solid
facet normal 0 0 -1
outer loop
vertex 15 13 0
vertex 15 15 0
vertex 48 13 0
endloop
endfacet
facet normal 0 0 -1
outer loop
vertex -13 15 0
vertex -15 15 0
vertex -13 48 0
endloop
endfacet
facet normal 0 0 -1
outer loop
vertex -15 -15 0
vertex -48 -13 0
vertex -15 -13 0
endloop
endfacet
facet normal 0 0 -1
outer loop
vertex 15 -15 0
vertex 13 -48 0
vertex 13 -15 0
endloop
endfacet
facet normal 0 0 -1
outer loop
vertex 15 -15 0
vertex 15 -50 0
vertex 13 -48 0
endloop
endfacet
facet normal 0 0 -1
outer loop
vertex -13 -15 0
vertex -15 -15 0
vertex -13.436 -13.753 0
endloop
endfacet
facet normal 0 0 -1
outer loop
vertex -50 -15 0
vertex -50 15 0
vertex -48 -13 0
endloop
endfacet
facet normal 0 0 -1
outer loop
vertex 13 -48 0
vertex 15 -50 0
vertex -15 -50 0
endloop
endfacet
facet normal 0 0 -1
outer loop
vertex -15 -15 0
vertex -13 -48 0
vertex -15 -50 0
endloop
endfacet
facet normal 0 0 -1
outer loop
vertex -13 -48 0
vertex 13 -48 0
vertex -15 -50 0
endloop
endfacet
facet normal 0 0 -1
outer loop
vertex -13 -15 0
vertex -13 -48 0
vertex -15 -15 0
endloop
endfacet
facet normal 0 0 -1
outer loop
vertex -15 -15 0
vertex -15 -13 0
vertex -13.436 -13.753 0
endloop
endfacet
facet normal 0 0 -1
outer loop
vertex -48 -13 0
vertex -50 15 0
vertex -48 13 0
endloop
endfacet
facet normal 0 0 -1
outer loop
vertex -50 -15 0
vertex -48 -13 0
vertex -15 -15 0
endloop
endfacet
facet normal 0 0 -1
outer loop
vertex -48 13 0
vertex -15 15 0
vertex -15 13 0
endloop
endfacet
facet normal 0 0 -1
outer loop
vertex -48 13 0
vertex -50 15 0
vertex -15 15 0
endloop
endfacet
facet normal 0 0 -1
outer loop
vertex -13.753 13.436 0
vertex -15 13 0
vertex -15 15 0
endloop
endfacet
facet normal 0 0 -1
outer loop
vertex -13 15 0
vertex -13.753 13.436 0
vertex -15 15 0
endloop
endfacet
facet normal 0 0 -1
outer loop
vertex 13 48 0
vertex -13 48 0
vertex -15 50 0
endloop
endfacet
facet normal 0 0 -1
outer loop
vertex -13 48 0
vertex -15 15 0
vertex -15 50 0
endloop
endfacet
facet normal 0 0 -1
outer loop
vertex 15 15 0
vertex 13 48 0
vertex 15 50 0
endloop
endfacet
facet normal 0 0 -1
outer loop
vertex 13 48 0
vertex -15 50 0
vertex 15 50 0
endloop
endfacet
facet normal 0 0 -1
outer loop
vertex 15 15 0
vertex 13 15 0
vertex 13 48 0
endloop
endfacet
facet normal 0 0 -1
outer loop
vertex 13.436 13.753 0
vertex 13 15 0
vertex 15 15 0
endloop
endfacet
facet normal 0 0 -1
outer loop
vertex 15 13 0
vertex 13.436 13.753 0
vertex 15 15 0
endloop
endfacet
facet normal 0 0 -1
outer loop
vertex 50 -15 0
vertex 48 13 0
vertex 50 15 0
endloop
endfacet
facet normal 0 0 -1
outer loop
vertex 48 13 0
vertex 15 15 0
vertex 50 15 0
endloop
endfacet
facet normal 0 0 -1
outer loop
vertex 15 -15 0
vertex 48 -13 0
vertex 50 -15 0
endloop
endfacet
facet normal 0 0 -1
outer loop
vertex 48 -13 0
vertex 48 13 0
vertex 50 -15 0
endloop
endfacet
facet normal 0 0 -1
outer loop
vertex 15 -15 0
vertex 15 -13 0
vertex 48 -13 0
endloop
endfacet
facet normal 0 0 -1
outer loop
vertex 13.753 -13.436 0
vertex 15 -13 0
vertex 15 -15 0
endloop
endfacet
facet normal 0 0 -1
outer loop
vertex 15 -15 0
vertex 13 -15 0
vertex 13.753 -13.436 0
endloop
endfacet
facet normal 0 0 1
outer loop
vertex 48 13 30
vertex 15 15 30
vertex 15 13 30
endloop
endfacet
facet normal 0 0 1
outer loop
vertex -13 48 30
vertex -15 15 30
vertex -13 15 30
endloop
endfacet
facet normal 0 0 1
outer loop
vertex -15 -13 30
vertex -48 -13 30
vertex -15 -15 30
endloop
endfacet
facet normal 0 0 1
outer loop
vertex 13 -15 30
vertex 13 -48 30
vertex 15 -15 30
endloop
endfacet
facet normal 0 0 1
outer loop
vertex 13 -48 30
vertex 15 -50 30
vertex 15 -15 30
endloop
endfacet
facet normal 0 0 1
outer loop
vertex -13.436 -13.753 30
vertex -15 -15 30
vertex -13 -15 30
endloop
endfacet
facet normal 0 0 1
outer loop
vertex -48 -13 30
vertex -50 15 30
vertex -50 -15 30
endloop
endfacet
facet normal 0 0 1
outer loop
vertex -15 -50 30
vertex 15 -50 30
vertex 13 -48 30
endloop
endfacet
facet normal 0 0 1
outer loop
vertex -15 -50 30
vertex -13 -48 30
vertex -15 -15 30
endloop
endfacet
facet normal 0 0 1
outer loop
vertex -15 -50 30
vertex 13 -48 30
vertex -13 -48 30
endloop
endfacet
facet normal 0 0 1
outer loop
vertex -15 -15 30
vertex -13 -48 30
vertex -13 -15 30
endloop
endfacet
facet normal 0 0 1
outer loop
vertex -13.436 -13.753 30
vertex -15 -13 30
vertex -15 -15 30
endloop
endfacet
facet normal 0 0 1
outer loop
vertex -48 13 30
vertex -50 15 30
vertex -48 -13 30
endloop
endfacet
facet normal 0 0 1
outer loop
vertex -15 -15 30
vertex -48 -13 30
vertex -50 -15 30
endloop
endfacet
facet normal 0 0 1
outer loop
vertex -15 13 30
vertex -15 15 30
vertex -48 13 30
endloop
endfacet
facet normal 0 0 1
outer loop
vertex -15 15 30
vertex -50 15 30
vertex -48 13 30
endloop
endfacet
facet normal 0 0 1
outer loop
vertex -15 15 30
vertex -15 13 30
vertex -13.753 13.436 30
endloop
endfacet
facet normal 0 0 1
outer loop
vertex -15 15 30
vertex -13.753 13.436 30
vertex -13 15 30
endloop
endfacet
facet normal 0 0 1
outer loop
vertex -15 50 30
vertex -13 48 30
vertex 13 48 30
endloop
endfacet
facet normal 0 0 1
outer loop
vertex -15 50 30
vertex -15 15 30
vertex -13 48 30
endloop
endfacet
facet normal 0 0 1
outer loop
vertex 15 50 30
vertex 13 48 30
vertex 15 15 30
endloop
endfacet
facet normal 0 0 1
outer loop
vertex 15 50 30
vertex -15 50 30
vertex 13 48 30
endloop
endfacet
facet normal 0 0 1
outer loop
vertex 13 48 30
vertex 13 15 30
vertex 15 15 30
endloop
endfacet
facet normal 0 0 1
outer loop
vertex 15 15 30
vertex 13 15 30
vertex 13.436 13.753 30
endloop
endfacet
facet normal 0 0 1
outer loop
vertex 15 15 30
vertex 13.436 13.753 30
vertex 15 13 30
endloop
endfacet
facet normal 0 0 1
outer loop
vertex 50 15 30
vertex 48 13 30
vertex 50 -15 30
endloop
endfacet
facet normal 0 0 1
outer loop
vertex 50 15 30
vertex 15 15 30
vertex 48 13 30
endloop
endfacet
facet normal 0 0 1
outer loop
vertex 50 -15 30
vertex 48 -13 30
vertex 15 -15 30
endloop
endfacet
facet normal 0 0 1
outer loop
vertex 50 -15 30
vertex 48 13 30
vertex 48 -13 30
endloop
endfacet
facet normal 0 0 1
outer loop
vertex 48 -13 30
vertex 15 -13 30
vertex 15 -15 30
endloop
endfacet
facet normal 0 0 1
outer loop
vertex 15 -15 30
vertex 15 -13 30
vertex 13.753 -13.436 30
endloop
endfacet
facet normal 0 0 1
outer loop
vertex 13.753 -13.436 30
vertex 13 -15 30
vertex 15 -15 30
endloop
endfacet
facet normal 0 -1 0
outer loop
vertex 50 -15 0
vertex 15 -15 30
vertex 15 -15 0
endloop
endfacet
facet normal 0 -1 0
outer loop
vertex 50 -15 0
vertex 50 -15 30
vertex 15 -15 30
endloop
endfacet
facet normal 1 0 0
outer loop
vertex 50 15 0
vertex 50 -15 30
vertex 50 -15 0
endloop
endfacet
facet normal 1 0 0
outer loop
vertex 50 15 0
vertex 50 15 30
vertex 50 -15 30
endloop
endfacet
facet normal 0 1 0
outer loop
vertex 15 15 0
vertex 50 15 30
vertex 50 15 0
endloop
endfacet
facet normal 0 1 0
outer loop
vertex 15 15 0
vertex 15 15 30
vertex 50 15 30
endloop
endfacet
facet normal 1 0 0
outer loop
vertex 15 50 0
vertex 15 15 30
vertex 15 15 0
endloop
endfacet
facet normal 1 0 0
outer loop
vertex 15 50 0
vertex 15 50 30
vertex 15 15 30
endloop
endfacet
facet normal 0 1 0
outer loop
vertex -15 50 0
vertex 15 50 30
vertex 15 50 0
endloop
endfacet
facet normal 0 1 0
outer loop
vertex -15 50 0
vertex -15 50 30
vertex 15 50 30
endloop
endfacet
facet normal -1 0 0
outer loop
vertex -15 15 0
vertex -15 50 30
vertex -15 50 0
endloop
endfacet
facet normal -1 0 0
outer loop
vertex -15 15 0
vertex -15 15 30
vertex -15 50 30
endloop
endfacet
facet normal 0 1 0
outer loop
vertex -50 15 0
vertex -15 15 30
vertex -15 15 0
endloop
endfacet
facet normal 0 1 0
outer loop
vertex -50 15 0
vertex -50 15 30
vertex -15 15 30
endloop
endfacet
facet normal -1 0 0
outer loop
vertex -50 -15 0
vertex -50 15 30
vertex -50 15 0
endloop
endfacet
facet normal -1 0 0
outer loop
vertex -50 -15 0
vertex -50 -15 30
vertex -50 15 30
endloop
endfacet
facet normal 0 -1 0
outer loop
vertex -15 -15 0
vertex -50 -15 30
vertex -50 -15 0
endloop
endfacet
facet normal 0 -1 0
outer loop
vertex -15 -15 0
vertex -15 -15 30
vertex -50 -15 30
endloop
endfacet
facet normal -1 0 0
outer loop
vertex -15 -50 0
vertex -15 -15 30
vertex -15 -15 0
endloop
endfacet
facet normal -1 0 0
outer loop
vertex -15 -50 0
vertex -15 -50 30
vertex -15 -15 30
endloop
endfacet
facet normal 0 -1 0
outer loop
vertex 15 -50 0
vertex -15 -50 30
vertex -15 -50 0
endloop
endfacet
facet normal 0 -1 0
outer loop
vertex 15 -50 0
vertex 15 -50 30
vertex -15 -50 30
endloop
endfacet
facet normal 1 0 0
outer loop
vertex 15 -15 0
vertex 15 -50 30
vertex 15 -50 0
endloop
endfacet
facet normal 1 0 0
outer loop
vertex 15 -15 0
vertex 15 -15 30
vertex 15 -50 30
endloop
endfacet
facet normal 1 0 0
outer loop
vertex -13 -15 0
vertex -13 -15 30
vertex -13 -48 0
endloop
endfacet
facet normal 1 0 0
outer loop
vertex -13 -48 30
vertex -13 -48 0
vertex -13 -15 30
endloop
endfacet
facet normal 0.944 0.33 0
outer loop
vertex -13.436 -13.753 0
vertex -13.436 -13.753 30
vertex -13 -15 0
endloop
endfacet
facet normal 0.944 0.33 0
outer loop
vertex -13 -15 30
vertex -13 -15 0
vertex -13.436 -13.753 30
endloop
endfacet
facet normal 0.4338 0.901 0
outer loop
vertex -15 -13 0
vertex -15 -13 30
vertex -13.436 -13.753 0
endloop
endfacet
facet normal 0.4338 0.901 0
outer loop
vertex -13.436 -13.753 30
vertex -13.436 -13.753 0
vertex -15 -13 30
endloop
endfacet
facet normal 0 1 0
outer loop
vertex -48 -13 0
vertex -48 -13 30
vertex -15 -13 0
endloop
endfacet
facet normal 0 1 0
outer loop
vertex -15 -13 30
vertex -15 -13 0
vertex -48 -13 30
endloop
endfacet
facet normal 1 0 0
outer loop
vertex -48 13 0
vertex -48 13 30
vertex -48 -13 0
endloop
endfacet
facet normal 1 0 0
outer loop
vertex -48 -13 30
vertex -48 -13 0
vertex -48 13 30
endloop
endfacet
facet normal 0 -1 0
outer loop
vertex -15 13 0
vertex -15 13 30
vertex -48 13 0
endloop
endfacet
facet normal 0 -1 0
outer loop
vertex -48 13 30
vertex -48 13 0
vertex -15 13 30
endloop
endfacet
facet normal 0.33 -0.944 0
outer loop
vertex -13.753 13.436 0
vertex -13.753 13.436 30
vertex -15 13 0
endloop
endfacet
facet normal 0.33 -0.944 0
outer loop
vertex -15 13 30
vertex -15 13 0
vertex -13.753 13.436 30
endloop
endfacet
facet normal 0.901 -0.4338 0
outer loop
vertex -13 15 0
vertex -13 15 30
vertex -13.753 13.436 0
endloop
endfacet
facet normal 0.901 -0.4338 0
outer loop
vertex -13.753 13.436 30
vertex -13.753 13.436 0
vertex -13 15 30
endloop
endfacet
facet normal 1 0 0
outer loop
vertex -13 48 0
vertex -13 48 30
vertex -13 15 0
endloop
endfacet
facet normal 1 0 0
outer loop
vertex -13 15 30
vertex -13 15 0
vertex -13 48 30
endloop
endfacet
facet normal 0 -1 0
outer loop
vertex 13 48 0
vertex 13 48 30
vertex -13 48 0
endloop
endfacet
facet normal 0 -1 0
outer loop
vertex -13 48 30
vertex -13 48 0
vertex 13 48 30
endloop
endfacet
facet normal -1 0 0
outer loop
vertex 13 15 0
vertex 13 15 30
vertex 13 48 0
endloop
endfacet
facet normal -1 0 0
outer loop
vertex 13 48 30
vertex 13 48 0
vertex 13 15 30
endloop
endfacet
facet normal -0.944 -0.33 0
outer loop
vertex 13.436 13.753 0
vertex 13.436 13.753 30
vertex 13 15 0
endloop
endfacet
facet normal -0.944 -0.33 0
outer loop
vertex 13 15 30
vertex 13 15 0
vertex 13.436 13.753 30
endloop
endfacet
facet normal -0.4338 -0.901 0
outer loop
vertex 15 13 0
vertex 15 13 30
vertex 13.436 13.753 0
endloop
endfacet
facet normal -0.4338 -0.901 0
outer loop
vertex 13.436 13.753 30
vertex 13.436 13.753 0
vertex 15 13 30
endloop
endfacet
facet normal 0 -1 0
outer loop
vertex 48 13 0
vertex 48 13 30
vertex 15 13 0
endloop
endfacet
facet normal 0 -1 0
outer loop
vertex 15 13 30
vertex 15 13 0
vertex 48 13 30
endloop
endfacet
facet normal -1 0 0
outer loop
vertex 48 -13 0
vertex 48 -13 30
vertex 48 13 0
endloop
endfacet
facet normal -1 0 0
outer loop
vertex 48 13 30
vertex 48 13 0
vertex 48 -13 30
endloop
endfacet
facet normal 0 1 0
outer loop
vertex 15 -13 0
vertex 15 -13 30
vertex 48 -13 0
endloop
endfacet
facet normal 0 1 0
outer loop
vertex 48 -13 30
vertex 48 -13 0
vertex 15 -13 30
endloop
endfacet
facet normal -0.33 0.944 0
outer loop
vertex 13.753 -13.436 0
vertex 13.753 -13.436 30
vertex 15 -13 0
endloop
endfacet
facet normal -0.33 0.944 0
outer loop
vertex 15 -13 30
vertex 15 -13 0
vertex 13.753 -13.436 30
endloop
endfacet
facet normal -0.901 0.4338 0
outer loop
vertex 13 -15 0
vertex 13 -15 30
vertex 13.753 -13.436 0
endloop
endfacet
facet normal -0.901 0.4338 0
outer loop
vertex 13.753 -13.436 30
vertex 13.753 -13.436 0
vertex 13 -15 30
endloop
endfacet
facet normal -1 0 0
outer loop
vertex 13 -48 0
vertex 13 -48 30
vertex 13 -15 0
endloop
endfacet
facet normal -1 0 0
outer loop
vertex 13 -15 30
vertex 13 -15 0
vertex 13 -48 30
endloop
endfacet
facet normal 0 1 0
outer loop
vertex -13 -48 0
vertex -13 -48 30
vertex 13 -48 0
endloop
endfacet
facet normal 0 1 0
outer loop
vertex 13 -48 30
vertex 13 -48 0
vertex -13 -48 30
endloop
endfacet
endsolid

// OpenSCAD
module cross() {
  square(size=[100, 30], center=true);
  square(size=[30, 100], center=true);
}

linear_extrude(30) {
  difference() {
    cross();
    offset(-2) {
      cross();
    }
  }
}
